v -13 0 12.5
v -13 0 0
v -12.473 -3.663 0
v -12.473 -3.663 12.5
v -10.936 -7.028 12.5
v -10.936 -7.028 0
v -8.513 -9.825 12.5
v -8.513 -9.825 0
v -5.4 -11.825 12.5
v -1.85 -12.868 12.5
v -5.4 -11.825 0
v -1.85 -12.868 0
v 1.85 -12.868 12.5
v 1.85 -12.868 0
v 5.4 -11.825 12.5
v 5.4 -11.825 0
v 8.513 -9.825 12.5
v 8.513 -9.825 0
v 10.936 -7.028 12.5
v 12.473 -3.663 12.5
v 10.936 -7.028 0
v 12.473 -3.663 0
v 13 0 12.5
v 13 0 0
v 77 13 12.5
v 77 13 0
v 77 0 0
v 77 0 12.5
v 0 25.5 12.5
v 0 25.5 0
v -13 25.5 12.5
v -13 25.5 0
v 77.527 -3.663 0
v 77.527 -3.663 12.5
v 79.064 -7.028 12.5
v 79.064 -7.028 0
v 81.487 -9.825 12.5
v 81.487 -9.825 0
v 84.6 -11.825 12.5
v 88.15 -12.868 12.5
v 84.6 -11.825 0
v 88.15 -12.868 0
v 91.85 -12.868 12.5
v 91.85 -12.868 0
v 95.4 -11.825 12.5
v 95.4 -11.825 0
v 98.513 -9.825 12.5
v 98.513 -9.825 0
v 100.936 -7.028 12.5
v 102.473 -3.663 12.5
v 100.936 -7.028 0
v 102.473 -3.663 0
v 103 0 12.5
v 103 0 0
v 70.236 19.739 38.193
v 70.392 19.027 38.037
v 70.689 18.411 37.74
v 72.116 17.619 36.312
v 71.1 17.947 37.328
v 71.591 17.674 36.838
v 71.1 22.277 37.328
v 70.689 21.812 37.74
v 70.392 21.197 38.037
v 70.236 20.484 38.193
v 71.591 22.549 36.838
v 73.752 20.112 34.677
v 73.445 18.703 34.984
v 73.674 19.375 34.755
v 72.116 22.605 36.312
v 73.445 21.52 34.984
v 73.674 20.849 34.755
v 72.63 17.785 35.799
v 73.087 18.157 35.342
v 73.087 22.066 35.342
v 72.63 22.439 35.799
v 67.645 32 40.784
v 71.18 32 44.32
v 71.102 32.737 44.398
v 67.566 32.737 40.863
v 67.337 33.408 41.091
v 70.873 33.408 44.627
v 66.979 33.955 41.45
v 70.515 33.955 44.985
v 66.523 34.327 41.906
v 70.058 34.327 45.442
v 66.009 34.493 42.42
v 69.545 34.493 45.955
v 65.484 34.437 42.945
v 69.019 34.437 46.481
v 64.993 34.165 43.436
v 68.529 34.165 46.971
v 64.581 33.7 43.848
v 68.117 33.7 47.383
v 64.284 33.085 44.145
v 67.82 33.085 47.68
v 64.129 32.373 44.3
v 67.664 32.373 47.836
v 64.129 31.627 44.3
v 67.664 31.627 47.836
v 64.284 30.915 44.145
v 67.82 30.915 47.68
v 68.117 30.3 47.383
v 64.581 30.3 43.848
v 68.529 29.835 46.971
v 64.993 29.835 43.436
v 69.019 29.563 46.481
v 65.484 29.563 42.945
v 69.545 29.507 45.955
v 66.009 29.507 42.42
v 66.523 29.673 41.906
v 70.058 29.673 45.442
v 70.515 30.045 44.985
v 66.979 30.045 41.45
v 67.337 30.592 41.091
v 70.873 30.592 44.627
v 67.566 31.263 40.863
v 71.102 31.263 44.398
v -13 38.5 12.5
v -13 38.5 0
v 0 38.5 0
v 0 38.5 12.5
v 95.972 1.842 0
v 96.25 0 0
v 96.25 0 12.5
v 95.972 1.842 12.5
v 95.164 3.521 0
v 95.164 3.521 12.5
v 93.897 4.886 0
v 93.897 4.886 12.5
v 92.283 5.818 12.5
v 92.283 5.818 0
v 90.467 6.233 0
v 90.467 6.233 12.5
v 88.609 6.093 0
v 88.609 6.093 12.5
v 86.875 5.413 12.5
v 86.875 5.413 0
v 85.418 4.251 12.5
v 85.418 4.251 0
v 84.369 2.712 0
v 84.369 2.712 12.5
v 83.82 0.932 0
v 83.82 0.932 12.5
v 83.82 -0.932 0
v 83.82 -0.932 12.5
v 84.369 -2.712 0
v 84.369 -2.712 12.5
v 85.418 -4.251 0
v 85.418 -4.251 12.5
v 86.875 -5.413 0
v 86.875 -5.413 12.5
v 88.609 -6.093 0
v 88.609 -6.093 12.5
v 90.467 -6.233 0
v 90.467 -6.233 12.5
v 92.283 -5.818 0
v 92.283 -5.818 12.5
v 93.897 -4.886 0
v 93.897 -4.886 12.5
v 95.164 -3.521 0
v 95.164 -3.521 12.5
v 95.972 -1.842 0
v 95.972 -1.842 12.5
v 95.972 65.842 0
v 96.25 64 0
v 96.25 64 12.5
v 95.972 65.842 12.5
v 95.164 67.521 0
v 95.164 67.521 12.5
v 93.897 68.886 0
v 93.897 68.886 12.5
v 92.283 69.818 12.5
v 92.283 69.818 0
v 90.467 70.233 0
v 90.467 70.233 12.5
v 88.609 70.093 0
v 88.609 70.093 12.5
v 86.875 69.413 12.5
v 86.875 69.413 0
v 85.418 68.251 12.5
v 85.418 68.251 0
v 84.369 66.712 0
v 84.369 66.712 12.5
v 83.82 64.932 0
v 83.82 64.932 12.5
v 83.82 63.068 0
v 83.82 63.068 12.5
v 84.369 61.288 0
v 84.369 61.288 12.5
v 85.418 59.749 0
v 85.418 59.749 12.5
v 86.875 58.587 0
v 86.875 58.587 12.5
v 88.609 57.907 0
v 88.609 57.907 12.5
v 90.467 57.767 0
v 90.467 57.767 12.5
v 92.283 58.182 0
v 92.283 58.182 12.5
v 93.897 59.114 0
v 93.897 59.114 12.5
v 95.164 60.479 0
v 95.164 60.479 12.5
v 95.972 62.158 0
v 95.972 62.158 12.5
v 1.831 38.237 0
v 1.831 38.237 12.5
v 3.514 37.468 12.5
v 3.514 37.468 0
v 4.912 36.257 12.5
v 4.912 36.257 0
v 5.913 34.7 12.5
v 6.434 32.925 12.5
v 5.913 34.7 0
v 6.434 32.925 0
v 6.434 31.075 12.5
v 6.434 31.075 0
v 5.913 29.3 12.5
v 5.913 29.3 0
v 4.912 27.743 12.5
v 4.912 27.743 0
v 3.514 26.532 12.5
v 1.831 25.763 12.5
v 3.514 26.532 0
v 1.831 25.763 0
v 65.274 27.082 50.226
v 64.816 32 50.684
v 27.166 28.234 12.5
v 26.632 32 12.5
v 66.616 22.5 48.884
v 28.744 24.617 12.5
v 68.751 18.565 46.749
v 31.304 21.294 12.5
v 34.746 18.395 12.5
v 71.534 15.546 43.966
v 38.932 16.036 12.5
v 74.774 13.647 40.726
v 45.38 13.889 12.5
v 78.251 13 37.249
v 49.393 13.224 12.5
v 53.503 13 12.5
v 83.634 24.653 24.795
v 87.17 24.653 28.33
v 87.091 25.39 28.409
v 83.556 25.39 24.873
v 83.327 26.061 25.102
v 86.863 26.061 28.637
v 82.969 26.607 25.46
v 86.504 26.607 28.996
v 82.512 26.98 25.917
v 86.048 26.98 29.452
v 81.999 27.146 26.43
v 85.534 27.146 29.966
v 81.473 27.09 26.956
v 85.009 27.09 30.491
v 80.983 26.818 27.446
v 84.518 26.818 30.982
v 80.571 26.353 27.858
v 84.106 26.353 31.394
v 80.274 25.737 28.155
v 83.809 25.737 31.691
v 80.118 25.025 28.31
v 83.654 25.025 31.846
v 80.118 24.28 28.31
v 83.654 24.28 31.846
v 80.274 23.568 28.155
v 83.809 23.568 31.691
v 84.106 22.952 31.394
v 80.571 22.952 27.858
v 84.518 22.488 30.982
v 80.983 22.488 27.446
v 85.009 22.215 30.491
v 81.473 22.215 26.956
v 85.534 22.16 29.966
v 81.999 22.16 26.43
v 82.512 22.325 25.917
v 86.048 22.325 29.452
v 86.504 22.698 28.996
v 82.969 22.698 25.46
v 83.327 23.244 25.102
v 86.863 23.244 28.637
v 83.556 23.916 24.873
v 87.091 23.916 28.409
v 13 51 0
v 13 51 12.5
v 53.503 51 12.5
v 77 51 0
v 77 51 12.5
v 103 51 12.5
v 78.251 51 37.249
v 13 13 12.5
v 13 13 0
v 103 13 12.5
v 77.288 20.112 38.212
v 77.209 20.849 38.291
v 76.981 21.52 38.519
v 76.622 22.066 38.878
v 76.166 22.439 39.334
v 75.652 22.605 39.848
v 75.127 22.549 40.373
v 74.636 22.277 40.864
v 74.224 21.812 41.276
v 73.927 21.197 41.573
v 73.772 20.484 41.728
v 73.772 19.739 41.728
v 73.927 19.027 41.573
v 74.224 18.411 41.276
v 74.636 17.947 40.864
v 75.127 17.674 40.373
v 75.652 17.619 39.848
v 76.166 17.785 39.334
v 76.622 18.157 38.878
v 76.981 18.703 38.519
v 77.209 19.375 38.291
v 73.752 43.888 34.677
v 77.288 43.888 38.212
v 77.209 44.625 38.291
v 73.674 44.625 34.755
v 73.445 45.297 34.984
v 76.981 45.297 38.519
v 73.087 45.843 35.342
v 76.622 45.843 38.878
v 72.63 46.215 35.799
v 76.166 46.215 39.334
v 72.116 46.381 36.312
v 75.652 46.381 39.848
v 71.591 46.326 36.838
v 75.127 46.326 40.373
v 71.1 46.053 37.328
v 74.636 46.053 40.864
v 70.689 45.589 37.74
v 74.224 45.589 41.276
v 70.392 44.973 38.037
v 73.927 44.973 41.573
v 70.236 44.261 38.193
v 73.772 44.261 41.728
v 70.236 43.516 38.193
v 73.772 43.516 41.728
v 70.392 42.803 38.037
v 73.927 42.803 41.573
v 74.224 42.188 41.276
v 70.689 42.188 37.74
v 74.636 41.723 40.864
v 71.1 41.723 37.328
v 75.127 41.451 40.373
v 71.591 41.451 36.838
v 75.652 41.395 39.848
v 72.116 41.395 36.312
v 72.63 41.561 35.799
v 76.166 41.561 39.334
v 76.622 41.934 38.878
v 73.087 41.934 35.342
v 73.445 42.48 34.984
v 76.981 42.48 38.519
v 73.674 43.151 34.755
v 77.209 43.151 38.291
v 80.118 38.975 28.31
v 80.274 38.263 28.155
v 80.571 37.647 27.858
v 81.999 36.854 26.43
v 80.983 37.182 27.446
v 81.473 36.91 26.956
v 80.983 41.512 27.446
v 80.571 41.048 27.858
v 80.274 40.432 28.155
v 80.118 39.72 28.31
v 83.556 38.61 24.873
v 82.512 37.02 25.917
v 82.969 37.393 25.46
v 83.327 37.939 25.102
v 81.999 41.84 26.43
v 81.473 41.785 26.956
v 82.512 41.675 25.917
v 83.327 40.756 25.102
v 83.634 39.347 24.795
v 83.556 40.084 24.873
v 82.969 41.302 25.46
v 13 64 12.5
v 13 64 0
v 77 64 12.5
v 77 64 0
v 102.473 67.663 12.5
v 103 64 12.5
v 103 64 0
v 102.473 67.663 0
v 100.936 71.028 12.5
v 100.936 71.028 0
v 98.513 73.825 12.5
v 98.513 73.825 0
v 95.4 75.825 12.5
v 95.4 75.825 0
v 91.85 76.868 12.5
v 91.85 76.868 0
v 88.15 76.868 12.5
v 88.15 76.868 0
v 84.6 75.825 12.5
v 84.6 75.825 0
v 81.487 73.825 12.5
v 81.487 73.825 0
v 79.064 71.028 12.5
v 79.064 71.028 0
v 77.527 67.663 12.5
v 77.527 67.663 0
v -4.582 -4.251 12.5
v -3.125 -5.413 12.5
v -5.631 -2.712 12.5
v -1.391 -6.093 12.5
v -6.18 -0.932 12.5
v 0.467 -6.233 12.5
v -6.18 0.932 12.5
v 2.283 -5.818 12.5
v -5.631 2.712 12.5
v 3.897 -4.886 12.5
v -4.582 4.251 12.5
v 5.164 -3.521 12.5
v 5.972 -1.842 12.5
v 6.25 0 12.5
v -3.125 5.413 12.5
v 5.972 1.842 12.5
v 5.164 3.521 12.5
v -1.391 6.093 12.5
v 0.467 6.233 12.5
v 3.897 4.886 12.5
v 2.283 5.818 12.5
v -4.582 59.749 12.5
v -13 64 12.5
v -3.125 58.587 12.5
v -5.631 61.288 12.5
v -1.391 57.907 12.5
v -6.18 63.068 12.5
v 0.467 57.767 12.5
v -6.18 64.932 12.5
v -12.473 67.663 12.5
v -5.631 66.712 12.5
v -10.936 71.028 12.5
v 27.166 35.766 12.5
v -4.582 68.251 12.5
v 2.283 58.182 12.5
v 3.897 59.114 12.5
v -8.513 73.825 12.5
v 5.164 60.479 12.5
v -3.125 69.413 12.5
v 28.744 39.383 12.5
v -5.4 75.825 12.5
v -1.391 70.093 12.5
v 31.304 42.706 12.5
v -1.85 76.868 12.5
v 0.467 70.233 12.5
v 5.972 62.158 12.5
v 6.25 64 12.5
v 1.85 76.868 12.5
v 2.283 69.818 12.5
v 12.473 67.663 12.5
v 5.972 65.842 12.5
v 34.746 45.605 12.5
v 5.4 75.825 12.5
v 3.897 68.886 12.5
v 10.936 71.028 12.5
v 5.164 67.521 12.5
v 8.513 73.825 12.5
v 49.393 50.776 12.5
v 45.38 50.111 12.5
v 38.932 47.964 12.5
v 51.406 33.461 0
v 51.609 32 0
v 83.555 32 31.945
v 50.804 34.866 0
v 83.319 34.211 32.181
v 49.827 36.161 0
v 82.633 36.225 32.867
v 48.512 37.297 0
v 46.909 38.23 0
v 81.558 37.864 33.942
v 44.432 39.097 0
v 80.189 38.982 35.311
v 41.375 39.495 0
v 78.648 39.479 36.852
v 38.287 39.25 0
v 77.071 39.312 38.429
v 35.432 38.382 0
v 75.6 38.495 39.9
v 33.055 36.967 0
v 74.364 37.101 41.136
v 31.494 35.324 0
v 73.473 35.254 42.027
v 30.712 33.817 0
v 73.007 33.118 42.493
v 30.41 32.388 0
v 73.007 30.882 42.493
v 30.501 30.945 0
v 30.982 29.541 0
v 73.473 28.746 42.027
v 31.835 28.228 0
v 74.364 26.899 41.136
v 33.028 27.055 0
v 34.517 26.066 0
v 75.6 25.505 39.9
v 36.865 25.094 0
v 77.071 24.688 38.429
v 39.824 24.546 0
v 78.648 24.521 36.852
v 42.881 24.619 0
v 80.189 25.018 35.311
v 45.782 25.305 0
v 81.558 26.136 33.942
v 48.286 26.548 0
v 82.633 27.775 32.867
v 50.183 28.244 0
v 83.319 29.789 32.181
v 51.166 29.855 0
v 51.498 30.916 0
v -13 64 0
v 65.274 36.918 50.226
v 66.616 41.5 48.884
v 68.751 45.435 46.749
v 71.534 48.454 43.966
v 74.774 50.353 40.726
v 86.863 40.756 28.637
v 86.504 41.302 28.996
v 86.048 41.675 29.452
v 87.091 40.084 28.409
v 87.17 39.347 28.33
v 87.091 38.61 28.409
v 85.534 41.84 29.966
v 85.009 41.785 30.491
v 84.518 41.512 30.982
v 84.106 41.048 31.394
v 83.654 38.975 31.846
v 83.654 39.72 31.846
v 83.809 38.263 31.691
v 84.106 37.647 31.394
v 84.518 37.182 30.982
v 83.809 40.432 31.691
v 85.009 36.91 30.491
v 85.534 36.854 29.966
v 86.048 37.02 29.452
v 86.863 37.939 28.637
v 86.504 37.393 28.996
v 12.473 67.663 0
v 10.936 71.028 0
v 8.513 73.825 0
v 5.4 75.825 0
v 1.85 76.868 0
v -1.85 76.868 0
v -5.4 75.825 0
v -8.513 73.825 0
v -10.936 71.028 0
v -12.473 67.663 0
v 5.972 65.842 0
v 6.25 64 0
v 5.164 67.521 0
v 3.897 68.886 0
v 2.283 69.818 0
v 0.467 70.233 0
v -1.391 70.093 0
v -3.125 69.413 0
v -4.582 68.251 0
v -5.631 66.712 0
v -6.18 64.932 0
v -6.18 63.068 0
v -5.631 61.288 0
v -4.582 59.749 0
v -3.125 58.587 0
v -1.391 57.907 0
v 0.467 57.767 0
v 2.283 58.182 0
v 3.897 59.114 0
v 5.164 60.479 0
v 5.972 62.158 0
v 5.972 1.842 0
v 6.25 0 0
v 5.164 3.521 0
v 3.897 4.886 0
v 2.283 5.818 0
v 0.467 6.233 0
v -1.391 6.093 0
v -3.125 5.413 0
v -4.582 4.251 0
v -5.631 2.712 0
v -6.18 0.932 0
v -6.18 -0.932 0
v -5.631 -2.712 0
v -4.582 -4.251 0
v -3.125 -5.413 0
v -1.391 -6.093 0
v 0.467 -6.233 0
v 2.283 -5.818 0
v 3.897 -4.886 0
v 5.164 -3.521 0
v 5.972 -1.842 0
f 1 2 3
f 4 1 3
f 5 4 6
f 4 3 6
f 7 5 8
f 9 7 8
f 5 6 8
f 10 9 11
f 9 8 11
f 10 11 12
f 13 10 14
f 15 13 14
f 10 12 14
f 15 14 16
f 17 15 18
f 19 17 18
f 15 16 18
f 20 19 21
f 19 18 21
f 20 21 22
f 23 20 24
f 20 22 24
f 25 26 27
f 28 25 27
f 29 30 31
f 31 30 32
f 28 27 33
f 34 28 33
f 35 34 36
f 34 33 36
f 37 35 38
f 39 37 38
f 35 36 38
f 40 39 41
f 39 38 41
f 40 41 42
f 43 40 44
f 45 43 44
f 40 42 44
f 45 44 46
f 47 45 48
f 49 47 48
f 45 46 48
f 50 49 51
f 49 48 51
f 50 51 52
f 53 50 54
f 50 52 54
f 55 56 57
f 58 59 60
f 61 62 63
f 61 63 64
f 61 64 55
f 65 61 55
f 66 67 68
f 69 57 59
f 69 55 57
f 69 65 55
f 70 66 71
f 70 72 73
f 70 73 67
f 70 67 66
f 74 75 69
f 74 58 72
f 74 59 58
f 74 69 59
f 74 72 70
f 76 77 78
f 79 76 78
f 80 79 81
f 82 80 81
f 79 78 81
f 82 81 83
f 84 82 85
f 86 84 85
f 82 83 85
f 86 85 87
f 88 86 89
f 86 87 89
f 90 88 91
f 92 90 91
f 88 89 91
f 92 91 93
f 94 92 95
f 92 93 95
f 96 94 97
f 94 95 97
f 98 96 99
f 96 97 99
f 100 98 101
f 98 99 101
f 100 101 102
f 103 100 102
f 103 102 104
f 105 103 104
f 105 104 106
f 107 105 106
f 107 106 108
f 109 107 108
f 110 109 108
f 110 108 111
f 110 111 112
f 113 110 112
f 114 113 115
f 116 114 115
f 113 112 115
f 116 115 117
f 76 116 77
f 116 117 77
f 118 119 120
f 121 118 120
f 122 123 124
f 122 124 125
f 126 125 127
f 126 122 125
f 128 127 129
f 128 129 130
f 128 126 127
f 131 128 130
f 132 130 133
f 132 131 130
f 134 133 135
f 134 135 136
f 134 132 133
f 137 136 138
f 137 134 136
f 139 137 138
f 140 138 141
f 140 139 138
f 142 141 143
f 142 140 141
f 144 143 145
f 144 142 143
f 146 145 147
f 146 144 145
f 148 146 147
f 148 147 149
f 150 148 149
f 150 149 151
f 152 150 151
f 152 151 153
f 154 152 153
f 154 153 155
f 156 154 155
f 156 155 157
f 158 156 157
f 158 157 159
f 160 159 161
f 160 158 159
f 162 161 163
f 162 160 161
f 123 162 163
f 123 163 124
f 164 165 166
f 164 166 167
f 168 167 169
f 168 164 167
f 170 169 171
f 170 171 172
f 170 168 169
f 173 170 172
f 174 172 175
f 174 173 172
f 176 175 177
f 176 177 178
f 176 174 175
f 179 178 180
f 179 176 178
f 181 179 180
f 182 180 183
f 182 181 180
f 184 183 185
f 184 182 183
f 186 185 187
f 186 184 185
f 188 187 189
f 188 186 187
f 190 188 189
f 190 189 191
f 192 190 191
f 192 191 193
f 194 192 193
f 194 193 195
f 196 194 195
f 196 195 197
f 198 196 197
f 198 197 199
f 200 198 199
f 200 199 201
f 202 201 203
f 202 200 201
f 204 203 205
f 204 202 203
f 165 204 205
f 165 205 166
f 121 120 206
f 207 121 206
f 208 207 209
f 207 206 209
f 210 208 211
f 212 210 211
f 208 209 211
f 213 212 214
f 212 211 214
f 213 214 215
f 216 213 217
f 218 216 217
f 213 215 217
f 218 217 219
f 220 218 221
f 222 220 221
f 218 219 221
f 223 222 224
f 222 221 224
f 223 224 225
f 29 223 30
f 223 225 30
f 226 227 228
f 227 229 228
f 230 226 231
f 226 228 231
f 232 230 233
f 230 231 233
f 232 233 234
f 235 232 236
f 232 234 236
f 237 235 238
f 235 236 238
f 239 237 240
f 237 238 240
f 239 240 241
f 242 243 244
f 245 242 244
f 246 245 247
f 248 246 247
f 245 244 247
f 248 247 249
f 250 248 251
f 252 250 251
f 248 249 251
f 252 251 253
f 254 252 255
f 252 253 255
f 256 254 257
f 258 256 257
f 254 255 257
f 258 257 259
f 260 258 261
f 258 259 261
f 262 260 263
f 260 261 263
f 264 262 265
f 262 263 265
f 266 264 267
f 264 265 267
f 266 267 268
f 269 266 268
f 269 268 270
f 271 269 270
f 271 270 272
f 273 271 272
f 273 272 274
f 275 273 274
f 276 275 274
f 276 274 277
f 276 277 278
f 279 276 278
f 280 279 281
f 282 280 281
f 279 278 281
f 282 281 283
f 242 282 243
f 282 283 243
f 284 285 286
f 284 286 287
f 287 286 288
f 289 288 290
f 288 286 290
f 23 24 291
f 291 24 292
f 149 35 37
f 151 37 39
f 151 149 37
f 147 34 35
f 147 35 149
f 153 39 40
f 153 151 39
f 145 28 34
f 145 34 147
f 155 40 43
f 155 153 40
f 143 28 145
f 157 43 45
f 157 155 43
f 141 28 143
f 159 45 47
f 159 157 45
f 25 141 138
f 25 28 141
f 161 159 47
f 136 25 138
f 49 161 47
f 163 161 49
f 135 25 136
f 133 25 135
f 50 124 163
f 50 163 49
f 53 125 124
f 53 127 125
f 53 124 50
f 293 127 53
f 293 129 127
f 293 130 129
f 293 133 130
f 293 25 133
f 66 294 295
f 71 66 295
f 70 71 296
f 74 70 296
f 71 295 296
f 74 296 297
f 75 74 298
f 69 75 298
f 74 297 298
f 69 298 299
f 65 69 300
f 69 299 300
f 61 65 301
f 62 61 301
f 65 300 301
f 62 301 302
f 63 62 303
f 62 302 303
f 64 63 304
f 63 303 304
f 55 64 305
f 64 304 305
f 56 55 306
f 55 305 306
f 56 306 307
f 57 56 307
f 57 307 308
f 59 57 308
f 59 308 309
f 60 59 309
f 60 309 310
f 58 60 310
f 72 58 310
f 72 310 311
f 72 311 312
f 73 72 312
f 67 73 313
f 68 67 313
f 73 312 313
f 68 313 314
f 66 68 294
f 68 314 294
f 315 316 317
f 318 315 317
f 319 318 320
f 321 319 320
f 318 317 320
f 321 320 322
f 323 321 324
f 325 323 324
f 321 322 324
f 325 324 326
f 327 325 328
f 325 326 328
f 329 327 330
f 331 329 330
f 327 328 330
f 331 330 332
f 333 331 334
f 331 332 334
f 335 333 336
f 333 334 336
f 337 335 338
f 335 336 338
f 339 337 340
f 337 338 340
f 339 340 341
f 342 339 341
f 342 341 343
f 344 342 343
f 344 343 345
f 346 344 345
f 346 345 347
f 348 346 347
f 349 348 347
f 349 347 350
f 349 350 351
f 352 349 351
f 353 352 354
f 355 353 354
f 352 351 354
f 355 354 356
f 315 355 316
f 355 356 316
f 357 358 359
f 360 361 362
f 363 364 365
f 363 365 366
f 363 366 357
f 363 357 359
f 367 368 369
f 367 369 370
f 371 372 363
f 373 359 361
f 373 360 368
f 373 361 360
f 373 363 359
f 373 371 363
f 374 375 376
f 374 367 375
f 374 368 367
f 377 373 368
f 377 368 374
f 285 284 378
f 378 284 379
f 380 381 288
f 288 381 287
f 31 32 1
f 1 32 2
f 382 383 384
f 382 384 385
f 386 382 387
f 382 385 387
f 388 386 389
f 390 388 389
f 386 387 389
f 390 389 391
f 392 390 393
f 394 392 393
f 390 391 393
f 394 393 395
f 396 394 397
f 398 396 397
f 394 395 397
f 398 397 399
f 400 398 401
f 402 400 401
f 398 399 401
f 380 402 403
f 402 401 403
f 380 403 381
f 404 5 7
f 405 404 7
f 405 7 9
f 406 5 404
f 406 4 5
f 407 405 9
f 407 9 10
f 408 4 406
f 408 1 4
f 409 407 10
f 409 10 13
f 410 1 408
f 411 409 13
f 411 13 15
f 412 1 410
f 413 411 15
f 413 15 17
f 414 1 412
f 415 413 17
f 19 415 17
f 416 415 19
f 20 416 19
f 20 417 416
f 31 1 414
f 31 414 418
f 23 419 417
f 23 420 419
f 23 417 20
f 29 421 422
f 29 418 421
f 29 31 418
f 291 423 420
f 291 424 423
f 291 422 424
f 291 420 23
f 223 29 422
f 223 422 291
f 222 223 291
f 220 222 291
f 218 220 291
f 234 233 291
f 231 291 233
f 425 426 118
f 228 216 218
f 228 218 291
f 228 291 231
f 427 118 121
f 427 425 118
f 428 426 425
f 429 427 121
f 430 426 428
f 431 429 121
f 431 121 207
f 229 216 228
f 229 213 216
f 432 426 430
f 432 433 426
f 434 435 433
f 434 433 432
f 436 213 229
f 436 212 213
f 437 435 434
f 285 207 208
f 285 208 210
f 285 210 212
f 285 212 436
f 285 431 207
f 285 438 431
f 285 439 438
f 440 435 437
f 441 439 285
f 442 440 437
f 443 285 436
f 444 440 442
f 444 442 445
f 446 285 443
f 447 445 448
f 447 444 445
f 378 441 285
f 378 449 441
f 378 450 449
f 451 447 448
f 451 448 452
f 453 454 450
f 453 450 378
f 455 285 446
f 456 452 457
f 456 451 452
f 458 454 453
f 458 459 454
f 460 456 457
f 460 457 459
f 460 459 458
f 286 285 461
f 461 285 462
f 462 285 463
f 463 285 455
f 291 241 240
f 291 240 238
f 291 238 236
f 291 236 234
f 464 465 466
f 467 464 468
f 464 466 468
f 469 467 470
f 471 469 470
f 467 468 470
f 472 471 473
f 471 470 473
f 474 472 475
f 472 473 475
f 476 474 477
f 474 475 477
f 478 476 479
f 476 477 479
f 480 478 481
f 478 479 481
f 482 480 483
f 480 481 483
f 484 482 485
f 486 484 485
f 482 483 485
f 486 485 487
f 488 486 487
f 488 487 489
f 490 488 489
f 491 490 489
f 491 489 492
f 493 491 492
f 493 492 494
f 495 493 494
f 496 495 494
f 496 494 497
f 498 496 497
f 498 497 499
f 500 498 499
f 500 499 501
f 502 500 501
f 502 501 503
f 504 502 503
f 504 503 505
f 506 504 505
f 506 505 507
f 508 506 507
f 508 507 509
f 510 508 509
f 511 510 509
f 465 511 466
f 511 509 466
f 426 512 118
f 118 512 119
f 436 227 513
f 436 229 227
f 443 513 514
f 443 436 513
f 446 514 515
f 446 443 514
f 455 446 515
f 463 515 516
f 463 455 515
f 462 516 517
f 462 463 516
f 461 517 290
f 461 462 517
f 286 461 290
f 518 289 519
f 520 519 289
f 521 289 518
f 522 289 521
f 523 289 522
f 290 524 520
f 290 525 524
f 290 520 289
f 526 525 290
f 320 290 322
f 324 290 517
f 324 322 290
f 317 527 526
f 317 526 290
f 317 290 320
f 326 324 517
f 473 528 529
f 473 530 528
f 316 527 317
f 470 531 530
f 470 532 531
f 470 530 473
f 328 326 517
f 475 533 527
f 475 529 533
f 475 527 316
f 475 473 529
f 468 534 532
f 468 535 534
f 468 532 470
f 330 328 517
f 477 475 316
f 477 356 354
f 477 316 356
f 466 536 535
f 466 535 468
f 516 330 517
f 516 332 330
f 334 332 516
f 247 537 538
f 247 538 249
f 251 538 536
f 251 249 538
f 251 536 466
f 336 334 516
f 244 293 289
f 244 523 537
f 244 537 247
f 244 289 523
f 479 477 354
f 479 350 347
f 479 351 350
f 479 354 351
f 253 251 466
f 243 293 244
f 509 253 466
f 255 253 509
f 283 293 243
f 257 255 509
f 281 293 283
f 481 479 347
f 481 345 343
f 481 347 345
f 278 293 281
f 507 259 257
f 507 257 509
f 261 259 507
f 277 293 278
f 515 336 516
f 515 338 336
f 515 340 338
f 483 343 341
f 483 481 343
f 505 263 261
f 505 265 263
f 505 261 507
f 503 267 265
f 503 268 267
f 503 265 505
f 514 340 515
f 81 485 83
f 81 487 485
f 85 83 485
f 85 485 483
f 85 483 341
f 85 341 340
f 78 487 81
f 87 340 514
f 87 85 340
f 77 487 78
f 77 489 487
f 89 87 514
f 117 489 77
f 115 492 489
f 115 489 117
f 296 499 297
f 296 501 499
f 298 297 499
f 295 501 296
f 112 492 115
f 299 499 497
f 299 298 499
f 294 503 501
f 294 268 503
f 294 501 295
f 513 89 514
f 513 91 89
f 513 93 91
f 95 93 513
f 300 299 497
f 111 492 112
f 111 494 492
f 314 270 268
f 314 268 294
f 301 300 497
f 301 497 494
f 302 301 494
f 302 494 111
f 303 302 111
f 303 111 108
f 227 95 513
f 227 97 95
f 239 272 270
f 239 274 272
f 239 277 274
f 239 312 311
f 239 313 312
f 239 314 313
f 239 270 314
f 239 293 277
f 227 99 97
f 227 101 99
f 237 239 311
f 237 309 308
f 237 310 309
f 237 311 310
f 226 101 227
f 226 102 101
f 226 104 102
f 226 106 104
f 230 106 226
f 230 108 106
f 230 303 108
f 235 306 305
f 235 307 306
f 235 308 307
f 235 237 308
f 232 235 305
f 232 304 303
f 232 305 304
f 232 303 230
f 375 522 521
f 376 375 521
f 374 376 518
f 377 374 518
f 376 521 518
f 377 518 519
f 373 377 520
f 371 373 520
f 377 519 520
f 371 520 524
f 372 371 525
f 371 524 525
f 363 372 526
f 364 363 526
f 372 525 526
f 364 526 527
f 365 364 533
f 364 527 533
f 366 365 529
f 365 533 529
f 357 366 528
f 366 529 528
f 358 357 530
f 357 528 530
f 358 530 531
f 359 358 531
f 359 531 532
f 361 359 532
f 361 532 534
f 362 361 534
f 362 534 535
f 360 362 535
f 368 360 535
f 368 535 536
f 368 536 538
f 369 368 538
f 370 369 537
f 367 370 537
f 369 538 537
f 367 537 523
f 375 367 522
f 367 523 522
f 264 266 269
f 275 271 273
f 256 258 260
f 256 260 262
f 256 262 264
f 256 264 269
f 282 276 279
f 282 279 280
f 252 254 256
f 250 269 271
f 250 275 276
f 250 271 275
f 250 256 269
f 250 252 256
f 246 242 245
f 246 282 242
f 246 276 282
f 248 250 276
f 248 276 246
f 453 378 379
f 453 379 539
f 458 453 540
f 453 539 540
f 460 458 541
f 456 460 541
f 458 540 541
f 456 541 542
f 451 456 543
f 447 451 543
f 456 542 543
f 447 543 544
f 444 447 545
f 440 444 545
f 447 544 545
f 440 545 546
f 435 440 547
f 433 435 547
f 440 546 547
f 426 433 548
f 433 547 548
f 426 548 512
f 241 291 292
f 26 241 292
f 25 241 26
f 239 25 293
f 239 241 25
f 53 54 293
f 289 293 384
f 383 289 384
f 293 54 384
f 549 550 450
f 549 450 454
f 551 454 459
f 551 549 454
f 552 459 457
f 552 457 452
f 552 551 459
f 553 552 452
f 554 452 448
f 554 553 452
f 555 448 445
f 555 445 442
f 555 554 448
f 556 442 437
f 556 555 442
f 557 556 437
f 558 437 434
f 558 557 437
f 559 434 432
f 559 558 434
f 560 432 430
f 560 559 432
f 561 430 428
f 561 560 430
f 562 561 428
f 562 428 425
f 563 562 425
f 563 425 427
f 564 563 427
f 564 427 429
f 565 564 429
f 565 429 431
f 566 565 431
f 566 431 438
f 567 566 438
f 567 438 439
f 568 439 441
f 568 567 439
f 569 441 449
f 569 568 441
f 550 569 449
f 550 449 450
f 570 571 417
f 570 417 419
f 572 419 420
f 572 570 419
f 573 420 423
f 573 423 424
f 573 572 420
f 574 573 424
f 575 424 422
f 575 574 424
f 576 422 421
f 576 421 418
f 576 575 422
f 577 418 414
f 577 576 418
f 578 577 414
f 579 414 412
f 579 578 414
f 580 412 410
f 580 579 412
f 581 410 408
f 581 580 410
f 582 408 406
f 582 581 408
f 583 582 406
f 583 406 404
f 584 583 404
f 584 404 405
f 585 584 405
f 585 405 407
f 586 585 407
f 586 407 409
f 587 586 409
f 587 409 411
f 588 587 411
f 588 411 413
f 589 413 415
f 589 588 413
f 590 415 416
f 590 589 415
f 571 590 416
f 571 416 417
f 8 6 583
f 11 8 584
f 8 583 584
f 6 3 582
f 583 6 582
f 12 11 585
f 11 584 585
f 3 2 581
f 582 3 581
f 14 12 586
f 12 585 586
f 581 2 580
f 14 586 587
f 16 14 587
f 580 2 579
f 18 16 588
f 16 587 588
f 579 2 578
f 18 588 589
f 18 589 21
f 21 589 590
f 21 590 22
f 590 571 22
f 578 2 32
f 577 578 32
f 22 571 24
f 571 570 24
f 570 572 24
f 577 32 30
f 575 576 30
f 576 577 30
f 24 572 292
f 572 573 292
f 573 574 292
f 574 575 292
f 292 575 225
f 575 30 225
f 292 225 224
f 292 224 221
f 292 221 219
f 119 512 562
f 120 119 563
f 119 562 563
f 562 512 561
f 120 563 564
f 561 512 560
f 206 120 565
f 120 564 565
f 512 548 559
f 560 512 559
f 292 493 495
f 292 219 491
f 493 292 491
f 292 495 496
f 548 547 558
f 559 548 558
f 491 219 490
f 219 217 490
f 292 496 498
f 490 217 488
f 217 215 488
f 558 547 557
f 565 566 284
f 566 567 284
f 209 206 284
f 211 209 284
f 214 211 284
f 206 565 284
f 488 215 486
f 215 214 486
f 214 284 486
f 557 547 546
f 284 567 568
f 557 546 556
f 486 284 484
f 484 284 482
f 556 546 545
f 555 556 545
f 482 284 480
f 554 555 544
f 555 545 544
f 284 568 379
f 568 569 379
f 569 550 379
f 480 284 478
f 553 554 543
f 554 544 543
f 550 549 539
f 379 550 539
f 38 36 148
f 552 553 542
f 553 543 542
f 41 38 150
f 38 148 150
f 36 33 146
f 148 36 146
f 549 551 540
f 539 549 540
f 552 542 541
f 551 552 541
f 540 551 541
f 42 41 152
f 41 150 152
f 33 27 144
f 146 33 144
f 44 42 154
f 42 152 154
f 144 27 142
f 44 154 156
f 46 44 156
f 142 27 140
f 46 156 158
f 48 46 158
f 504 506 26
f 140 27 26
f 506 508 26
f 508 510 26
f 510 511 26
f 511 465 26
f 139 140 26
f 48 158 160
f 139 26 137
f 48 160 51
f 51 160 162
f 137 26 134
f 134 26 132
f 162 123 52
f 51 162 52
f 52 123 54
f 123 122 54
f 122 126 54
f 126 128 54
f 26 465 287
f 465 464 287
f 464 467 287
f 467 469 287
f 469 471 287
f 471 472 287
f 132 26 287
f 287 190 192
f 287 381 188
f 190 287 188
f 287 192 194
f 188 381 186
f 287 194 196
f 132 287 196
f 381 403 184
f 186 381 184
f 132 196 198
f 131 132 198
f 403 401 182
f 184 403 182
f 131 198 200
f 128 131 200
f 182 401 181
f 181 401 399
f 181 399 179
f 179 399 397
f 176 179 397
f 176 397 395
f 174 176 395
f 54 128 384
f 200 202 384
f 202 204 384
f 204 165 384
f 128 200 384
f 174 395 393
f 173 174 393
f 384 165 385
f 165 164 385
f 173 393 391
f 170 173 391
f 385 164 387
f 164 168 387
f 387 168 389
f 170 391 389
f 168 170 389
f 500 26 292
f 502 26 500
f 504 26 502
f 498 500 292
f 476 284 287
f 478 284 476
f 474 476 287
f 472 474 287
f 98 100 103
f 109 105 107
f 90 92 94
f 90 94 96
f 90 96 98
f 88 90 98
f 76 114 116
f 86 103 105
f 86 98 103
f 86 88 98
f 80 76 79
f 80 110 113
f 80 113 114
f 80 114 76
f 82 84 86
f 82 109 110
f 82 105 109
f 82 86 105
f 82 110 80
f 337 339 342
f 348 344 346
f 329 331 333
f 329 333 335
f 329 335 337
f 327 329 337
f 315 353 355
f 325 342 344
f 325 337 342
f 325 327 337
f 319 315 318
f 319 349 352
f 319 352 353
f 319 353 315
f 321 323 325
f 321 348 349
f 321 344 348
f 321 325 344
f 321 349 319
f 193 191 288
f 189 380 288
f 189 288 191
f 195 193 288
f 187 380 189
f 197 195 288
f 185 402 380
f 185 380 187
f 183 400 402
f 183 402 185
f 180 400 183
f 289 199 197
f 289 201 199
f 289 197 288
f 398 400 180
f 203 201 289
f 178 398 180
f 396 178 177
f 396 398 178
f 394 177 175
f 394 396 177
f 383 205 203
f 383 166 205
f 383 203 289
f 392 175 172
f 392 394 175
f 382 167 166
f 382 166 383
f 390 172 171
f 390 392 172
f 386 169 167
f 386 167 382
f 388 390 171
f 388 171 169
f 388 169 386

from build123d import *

# Parameters (mm, degrees)
F0_R     = 6.25
F1_DEPTH = 12.5
F3_DEPTH = 38
F4_R     = 18.99999
F5_R     = 2.5
F6_DEPTH = 5
F7_R     = 7.5
F8_DEPTH = 100


# Not quite as in the source:
# - a fillet or chamfer is up to 0.001 mm smaller than in the source, because OpenCascade refuses the exact size


with BuildPart() as f1:
    # F0 (on Top) → F1 (new body)
    with BuildSketch(Plane.XY):
        with BuildLine():
            Line((-13, 25.5), (-13, 0))
            ThreePointArc((-13, 0), (0, -13), (13, 0))
            Line((13, 0), (13, 13))
            Line((13, 13), (77, 13))
            Line((77, 13), (77, 0))
            ThreePointArc((77, 0), (90, -13), (103, 0))
            Line((103, 0), (103, 64))
            ThreePointArc((103, 64), (90, 77), (77, 64))
            Line((77, 64), (77, 51))
            Line((77, 51), (13, 51))
            Line((13, 51), (13, 64))
            ThreePointArc((13, 64), (0, 77), (-13, 64))
            Line((-13, 64), (-13, 38.5))
            Line((-13, 38.5), (0, 38.5))
            ThreePointArc((0, 38.5), (6.5, 32), (0, 25.5))
            Line((0, 25.5), (-13, 25.5))
        make_face()
        Circle(F0_R, mode=Mode.SUBTRACT)
        with Locations((90, 0)):
            Circle(F0_R, mode=Mode.SUBTRACT)
        with Locations((0, 64)):
            Circle(F0_R, mode=Mode.SUBTRACT)
        with Locations((90, 64)):
            Circle(F0_R, mode=Mode.SUBTRACT)
    extrude(amount=F1_DEPTH)

    # F2 (on face) → F3 (join)
    with BuildSketch(Plane.XZ.offset(-13)):
        Polygon((26.6324676319, 12.5), (77, 12.5), (103, 12.5), (64.8162338159, 50.6837661841), align=None)
    extrude(amount=-F3_DEPTH)

    # F4 (radius 19 in the source; OpenCascade refuses exactly that, so slightly less here)
    f4_edges = [f1.edges().sort_by_distance(p)[0] for p in [
        (45.724351, 13, 31.591883),
        (45.724351, 51, 31.591883),
    ]]
    fillet(f4_edges, radius=F4_R)

    # F5 (on face) → F6 (cut)
    with BuildSketch(Plane(origin=(57.75, 0, 57.75), x_dir=(0.7071067812, 0, -0.7071067812), z_dir=(0.7071067812, 0, 0.7071067812))):
        with Locations((25.1304512677, 20.1117935463)):
            Circle(F5_R)
        with Locations((39.1058761271, 24.6526843463)):
            Circle(F5_R)
        with Locations((39.1058761271, 39.3473156537)):
            Circle(F5_R)
        with Locations((25.1304512677, 43.8882064537)):
            Circle(F5_R)
        with Locations((16.4931636974, 32)):
            Circle(F5_R)
    extrude(amount=-F6_DEPTH, mode=Mode.SUBTRACT)

    # F7 (on face) → F8 (cut)
    with BuildSketch(Plane(origin=(57.75, 0, 57.75), x_dir=(0.7071067812, 0, -0.7071067812), z_dir=(0.7071067812, 0, 0.7071067812))):
        with Locations((28.9931636974, 32)):
            Circle(F7_R)
    extrude(amount=-F8_DEPTH, mode=Mode.SUBTRACT)


solid = f1.part
